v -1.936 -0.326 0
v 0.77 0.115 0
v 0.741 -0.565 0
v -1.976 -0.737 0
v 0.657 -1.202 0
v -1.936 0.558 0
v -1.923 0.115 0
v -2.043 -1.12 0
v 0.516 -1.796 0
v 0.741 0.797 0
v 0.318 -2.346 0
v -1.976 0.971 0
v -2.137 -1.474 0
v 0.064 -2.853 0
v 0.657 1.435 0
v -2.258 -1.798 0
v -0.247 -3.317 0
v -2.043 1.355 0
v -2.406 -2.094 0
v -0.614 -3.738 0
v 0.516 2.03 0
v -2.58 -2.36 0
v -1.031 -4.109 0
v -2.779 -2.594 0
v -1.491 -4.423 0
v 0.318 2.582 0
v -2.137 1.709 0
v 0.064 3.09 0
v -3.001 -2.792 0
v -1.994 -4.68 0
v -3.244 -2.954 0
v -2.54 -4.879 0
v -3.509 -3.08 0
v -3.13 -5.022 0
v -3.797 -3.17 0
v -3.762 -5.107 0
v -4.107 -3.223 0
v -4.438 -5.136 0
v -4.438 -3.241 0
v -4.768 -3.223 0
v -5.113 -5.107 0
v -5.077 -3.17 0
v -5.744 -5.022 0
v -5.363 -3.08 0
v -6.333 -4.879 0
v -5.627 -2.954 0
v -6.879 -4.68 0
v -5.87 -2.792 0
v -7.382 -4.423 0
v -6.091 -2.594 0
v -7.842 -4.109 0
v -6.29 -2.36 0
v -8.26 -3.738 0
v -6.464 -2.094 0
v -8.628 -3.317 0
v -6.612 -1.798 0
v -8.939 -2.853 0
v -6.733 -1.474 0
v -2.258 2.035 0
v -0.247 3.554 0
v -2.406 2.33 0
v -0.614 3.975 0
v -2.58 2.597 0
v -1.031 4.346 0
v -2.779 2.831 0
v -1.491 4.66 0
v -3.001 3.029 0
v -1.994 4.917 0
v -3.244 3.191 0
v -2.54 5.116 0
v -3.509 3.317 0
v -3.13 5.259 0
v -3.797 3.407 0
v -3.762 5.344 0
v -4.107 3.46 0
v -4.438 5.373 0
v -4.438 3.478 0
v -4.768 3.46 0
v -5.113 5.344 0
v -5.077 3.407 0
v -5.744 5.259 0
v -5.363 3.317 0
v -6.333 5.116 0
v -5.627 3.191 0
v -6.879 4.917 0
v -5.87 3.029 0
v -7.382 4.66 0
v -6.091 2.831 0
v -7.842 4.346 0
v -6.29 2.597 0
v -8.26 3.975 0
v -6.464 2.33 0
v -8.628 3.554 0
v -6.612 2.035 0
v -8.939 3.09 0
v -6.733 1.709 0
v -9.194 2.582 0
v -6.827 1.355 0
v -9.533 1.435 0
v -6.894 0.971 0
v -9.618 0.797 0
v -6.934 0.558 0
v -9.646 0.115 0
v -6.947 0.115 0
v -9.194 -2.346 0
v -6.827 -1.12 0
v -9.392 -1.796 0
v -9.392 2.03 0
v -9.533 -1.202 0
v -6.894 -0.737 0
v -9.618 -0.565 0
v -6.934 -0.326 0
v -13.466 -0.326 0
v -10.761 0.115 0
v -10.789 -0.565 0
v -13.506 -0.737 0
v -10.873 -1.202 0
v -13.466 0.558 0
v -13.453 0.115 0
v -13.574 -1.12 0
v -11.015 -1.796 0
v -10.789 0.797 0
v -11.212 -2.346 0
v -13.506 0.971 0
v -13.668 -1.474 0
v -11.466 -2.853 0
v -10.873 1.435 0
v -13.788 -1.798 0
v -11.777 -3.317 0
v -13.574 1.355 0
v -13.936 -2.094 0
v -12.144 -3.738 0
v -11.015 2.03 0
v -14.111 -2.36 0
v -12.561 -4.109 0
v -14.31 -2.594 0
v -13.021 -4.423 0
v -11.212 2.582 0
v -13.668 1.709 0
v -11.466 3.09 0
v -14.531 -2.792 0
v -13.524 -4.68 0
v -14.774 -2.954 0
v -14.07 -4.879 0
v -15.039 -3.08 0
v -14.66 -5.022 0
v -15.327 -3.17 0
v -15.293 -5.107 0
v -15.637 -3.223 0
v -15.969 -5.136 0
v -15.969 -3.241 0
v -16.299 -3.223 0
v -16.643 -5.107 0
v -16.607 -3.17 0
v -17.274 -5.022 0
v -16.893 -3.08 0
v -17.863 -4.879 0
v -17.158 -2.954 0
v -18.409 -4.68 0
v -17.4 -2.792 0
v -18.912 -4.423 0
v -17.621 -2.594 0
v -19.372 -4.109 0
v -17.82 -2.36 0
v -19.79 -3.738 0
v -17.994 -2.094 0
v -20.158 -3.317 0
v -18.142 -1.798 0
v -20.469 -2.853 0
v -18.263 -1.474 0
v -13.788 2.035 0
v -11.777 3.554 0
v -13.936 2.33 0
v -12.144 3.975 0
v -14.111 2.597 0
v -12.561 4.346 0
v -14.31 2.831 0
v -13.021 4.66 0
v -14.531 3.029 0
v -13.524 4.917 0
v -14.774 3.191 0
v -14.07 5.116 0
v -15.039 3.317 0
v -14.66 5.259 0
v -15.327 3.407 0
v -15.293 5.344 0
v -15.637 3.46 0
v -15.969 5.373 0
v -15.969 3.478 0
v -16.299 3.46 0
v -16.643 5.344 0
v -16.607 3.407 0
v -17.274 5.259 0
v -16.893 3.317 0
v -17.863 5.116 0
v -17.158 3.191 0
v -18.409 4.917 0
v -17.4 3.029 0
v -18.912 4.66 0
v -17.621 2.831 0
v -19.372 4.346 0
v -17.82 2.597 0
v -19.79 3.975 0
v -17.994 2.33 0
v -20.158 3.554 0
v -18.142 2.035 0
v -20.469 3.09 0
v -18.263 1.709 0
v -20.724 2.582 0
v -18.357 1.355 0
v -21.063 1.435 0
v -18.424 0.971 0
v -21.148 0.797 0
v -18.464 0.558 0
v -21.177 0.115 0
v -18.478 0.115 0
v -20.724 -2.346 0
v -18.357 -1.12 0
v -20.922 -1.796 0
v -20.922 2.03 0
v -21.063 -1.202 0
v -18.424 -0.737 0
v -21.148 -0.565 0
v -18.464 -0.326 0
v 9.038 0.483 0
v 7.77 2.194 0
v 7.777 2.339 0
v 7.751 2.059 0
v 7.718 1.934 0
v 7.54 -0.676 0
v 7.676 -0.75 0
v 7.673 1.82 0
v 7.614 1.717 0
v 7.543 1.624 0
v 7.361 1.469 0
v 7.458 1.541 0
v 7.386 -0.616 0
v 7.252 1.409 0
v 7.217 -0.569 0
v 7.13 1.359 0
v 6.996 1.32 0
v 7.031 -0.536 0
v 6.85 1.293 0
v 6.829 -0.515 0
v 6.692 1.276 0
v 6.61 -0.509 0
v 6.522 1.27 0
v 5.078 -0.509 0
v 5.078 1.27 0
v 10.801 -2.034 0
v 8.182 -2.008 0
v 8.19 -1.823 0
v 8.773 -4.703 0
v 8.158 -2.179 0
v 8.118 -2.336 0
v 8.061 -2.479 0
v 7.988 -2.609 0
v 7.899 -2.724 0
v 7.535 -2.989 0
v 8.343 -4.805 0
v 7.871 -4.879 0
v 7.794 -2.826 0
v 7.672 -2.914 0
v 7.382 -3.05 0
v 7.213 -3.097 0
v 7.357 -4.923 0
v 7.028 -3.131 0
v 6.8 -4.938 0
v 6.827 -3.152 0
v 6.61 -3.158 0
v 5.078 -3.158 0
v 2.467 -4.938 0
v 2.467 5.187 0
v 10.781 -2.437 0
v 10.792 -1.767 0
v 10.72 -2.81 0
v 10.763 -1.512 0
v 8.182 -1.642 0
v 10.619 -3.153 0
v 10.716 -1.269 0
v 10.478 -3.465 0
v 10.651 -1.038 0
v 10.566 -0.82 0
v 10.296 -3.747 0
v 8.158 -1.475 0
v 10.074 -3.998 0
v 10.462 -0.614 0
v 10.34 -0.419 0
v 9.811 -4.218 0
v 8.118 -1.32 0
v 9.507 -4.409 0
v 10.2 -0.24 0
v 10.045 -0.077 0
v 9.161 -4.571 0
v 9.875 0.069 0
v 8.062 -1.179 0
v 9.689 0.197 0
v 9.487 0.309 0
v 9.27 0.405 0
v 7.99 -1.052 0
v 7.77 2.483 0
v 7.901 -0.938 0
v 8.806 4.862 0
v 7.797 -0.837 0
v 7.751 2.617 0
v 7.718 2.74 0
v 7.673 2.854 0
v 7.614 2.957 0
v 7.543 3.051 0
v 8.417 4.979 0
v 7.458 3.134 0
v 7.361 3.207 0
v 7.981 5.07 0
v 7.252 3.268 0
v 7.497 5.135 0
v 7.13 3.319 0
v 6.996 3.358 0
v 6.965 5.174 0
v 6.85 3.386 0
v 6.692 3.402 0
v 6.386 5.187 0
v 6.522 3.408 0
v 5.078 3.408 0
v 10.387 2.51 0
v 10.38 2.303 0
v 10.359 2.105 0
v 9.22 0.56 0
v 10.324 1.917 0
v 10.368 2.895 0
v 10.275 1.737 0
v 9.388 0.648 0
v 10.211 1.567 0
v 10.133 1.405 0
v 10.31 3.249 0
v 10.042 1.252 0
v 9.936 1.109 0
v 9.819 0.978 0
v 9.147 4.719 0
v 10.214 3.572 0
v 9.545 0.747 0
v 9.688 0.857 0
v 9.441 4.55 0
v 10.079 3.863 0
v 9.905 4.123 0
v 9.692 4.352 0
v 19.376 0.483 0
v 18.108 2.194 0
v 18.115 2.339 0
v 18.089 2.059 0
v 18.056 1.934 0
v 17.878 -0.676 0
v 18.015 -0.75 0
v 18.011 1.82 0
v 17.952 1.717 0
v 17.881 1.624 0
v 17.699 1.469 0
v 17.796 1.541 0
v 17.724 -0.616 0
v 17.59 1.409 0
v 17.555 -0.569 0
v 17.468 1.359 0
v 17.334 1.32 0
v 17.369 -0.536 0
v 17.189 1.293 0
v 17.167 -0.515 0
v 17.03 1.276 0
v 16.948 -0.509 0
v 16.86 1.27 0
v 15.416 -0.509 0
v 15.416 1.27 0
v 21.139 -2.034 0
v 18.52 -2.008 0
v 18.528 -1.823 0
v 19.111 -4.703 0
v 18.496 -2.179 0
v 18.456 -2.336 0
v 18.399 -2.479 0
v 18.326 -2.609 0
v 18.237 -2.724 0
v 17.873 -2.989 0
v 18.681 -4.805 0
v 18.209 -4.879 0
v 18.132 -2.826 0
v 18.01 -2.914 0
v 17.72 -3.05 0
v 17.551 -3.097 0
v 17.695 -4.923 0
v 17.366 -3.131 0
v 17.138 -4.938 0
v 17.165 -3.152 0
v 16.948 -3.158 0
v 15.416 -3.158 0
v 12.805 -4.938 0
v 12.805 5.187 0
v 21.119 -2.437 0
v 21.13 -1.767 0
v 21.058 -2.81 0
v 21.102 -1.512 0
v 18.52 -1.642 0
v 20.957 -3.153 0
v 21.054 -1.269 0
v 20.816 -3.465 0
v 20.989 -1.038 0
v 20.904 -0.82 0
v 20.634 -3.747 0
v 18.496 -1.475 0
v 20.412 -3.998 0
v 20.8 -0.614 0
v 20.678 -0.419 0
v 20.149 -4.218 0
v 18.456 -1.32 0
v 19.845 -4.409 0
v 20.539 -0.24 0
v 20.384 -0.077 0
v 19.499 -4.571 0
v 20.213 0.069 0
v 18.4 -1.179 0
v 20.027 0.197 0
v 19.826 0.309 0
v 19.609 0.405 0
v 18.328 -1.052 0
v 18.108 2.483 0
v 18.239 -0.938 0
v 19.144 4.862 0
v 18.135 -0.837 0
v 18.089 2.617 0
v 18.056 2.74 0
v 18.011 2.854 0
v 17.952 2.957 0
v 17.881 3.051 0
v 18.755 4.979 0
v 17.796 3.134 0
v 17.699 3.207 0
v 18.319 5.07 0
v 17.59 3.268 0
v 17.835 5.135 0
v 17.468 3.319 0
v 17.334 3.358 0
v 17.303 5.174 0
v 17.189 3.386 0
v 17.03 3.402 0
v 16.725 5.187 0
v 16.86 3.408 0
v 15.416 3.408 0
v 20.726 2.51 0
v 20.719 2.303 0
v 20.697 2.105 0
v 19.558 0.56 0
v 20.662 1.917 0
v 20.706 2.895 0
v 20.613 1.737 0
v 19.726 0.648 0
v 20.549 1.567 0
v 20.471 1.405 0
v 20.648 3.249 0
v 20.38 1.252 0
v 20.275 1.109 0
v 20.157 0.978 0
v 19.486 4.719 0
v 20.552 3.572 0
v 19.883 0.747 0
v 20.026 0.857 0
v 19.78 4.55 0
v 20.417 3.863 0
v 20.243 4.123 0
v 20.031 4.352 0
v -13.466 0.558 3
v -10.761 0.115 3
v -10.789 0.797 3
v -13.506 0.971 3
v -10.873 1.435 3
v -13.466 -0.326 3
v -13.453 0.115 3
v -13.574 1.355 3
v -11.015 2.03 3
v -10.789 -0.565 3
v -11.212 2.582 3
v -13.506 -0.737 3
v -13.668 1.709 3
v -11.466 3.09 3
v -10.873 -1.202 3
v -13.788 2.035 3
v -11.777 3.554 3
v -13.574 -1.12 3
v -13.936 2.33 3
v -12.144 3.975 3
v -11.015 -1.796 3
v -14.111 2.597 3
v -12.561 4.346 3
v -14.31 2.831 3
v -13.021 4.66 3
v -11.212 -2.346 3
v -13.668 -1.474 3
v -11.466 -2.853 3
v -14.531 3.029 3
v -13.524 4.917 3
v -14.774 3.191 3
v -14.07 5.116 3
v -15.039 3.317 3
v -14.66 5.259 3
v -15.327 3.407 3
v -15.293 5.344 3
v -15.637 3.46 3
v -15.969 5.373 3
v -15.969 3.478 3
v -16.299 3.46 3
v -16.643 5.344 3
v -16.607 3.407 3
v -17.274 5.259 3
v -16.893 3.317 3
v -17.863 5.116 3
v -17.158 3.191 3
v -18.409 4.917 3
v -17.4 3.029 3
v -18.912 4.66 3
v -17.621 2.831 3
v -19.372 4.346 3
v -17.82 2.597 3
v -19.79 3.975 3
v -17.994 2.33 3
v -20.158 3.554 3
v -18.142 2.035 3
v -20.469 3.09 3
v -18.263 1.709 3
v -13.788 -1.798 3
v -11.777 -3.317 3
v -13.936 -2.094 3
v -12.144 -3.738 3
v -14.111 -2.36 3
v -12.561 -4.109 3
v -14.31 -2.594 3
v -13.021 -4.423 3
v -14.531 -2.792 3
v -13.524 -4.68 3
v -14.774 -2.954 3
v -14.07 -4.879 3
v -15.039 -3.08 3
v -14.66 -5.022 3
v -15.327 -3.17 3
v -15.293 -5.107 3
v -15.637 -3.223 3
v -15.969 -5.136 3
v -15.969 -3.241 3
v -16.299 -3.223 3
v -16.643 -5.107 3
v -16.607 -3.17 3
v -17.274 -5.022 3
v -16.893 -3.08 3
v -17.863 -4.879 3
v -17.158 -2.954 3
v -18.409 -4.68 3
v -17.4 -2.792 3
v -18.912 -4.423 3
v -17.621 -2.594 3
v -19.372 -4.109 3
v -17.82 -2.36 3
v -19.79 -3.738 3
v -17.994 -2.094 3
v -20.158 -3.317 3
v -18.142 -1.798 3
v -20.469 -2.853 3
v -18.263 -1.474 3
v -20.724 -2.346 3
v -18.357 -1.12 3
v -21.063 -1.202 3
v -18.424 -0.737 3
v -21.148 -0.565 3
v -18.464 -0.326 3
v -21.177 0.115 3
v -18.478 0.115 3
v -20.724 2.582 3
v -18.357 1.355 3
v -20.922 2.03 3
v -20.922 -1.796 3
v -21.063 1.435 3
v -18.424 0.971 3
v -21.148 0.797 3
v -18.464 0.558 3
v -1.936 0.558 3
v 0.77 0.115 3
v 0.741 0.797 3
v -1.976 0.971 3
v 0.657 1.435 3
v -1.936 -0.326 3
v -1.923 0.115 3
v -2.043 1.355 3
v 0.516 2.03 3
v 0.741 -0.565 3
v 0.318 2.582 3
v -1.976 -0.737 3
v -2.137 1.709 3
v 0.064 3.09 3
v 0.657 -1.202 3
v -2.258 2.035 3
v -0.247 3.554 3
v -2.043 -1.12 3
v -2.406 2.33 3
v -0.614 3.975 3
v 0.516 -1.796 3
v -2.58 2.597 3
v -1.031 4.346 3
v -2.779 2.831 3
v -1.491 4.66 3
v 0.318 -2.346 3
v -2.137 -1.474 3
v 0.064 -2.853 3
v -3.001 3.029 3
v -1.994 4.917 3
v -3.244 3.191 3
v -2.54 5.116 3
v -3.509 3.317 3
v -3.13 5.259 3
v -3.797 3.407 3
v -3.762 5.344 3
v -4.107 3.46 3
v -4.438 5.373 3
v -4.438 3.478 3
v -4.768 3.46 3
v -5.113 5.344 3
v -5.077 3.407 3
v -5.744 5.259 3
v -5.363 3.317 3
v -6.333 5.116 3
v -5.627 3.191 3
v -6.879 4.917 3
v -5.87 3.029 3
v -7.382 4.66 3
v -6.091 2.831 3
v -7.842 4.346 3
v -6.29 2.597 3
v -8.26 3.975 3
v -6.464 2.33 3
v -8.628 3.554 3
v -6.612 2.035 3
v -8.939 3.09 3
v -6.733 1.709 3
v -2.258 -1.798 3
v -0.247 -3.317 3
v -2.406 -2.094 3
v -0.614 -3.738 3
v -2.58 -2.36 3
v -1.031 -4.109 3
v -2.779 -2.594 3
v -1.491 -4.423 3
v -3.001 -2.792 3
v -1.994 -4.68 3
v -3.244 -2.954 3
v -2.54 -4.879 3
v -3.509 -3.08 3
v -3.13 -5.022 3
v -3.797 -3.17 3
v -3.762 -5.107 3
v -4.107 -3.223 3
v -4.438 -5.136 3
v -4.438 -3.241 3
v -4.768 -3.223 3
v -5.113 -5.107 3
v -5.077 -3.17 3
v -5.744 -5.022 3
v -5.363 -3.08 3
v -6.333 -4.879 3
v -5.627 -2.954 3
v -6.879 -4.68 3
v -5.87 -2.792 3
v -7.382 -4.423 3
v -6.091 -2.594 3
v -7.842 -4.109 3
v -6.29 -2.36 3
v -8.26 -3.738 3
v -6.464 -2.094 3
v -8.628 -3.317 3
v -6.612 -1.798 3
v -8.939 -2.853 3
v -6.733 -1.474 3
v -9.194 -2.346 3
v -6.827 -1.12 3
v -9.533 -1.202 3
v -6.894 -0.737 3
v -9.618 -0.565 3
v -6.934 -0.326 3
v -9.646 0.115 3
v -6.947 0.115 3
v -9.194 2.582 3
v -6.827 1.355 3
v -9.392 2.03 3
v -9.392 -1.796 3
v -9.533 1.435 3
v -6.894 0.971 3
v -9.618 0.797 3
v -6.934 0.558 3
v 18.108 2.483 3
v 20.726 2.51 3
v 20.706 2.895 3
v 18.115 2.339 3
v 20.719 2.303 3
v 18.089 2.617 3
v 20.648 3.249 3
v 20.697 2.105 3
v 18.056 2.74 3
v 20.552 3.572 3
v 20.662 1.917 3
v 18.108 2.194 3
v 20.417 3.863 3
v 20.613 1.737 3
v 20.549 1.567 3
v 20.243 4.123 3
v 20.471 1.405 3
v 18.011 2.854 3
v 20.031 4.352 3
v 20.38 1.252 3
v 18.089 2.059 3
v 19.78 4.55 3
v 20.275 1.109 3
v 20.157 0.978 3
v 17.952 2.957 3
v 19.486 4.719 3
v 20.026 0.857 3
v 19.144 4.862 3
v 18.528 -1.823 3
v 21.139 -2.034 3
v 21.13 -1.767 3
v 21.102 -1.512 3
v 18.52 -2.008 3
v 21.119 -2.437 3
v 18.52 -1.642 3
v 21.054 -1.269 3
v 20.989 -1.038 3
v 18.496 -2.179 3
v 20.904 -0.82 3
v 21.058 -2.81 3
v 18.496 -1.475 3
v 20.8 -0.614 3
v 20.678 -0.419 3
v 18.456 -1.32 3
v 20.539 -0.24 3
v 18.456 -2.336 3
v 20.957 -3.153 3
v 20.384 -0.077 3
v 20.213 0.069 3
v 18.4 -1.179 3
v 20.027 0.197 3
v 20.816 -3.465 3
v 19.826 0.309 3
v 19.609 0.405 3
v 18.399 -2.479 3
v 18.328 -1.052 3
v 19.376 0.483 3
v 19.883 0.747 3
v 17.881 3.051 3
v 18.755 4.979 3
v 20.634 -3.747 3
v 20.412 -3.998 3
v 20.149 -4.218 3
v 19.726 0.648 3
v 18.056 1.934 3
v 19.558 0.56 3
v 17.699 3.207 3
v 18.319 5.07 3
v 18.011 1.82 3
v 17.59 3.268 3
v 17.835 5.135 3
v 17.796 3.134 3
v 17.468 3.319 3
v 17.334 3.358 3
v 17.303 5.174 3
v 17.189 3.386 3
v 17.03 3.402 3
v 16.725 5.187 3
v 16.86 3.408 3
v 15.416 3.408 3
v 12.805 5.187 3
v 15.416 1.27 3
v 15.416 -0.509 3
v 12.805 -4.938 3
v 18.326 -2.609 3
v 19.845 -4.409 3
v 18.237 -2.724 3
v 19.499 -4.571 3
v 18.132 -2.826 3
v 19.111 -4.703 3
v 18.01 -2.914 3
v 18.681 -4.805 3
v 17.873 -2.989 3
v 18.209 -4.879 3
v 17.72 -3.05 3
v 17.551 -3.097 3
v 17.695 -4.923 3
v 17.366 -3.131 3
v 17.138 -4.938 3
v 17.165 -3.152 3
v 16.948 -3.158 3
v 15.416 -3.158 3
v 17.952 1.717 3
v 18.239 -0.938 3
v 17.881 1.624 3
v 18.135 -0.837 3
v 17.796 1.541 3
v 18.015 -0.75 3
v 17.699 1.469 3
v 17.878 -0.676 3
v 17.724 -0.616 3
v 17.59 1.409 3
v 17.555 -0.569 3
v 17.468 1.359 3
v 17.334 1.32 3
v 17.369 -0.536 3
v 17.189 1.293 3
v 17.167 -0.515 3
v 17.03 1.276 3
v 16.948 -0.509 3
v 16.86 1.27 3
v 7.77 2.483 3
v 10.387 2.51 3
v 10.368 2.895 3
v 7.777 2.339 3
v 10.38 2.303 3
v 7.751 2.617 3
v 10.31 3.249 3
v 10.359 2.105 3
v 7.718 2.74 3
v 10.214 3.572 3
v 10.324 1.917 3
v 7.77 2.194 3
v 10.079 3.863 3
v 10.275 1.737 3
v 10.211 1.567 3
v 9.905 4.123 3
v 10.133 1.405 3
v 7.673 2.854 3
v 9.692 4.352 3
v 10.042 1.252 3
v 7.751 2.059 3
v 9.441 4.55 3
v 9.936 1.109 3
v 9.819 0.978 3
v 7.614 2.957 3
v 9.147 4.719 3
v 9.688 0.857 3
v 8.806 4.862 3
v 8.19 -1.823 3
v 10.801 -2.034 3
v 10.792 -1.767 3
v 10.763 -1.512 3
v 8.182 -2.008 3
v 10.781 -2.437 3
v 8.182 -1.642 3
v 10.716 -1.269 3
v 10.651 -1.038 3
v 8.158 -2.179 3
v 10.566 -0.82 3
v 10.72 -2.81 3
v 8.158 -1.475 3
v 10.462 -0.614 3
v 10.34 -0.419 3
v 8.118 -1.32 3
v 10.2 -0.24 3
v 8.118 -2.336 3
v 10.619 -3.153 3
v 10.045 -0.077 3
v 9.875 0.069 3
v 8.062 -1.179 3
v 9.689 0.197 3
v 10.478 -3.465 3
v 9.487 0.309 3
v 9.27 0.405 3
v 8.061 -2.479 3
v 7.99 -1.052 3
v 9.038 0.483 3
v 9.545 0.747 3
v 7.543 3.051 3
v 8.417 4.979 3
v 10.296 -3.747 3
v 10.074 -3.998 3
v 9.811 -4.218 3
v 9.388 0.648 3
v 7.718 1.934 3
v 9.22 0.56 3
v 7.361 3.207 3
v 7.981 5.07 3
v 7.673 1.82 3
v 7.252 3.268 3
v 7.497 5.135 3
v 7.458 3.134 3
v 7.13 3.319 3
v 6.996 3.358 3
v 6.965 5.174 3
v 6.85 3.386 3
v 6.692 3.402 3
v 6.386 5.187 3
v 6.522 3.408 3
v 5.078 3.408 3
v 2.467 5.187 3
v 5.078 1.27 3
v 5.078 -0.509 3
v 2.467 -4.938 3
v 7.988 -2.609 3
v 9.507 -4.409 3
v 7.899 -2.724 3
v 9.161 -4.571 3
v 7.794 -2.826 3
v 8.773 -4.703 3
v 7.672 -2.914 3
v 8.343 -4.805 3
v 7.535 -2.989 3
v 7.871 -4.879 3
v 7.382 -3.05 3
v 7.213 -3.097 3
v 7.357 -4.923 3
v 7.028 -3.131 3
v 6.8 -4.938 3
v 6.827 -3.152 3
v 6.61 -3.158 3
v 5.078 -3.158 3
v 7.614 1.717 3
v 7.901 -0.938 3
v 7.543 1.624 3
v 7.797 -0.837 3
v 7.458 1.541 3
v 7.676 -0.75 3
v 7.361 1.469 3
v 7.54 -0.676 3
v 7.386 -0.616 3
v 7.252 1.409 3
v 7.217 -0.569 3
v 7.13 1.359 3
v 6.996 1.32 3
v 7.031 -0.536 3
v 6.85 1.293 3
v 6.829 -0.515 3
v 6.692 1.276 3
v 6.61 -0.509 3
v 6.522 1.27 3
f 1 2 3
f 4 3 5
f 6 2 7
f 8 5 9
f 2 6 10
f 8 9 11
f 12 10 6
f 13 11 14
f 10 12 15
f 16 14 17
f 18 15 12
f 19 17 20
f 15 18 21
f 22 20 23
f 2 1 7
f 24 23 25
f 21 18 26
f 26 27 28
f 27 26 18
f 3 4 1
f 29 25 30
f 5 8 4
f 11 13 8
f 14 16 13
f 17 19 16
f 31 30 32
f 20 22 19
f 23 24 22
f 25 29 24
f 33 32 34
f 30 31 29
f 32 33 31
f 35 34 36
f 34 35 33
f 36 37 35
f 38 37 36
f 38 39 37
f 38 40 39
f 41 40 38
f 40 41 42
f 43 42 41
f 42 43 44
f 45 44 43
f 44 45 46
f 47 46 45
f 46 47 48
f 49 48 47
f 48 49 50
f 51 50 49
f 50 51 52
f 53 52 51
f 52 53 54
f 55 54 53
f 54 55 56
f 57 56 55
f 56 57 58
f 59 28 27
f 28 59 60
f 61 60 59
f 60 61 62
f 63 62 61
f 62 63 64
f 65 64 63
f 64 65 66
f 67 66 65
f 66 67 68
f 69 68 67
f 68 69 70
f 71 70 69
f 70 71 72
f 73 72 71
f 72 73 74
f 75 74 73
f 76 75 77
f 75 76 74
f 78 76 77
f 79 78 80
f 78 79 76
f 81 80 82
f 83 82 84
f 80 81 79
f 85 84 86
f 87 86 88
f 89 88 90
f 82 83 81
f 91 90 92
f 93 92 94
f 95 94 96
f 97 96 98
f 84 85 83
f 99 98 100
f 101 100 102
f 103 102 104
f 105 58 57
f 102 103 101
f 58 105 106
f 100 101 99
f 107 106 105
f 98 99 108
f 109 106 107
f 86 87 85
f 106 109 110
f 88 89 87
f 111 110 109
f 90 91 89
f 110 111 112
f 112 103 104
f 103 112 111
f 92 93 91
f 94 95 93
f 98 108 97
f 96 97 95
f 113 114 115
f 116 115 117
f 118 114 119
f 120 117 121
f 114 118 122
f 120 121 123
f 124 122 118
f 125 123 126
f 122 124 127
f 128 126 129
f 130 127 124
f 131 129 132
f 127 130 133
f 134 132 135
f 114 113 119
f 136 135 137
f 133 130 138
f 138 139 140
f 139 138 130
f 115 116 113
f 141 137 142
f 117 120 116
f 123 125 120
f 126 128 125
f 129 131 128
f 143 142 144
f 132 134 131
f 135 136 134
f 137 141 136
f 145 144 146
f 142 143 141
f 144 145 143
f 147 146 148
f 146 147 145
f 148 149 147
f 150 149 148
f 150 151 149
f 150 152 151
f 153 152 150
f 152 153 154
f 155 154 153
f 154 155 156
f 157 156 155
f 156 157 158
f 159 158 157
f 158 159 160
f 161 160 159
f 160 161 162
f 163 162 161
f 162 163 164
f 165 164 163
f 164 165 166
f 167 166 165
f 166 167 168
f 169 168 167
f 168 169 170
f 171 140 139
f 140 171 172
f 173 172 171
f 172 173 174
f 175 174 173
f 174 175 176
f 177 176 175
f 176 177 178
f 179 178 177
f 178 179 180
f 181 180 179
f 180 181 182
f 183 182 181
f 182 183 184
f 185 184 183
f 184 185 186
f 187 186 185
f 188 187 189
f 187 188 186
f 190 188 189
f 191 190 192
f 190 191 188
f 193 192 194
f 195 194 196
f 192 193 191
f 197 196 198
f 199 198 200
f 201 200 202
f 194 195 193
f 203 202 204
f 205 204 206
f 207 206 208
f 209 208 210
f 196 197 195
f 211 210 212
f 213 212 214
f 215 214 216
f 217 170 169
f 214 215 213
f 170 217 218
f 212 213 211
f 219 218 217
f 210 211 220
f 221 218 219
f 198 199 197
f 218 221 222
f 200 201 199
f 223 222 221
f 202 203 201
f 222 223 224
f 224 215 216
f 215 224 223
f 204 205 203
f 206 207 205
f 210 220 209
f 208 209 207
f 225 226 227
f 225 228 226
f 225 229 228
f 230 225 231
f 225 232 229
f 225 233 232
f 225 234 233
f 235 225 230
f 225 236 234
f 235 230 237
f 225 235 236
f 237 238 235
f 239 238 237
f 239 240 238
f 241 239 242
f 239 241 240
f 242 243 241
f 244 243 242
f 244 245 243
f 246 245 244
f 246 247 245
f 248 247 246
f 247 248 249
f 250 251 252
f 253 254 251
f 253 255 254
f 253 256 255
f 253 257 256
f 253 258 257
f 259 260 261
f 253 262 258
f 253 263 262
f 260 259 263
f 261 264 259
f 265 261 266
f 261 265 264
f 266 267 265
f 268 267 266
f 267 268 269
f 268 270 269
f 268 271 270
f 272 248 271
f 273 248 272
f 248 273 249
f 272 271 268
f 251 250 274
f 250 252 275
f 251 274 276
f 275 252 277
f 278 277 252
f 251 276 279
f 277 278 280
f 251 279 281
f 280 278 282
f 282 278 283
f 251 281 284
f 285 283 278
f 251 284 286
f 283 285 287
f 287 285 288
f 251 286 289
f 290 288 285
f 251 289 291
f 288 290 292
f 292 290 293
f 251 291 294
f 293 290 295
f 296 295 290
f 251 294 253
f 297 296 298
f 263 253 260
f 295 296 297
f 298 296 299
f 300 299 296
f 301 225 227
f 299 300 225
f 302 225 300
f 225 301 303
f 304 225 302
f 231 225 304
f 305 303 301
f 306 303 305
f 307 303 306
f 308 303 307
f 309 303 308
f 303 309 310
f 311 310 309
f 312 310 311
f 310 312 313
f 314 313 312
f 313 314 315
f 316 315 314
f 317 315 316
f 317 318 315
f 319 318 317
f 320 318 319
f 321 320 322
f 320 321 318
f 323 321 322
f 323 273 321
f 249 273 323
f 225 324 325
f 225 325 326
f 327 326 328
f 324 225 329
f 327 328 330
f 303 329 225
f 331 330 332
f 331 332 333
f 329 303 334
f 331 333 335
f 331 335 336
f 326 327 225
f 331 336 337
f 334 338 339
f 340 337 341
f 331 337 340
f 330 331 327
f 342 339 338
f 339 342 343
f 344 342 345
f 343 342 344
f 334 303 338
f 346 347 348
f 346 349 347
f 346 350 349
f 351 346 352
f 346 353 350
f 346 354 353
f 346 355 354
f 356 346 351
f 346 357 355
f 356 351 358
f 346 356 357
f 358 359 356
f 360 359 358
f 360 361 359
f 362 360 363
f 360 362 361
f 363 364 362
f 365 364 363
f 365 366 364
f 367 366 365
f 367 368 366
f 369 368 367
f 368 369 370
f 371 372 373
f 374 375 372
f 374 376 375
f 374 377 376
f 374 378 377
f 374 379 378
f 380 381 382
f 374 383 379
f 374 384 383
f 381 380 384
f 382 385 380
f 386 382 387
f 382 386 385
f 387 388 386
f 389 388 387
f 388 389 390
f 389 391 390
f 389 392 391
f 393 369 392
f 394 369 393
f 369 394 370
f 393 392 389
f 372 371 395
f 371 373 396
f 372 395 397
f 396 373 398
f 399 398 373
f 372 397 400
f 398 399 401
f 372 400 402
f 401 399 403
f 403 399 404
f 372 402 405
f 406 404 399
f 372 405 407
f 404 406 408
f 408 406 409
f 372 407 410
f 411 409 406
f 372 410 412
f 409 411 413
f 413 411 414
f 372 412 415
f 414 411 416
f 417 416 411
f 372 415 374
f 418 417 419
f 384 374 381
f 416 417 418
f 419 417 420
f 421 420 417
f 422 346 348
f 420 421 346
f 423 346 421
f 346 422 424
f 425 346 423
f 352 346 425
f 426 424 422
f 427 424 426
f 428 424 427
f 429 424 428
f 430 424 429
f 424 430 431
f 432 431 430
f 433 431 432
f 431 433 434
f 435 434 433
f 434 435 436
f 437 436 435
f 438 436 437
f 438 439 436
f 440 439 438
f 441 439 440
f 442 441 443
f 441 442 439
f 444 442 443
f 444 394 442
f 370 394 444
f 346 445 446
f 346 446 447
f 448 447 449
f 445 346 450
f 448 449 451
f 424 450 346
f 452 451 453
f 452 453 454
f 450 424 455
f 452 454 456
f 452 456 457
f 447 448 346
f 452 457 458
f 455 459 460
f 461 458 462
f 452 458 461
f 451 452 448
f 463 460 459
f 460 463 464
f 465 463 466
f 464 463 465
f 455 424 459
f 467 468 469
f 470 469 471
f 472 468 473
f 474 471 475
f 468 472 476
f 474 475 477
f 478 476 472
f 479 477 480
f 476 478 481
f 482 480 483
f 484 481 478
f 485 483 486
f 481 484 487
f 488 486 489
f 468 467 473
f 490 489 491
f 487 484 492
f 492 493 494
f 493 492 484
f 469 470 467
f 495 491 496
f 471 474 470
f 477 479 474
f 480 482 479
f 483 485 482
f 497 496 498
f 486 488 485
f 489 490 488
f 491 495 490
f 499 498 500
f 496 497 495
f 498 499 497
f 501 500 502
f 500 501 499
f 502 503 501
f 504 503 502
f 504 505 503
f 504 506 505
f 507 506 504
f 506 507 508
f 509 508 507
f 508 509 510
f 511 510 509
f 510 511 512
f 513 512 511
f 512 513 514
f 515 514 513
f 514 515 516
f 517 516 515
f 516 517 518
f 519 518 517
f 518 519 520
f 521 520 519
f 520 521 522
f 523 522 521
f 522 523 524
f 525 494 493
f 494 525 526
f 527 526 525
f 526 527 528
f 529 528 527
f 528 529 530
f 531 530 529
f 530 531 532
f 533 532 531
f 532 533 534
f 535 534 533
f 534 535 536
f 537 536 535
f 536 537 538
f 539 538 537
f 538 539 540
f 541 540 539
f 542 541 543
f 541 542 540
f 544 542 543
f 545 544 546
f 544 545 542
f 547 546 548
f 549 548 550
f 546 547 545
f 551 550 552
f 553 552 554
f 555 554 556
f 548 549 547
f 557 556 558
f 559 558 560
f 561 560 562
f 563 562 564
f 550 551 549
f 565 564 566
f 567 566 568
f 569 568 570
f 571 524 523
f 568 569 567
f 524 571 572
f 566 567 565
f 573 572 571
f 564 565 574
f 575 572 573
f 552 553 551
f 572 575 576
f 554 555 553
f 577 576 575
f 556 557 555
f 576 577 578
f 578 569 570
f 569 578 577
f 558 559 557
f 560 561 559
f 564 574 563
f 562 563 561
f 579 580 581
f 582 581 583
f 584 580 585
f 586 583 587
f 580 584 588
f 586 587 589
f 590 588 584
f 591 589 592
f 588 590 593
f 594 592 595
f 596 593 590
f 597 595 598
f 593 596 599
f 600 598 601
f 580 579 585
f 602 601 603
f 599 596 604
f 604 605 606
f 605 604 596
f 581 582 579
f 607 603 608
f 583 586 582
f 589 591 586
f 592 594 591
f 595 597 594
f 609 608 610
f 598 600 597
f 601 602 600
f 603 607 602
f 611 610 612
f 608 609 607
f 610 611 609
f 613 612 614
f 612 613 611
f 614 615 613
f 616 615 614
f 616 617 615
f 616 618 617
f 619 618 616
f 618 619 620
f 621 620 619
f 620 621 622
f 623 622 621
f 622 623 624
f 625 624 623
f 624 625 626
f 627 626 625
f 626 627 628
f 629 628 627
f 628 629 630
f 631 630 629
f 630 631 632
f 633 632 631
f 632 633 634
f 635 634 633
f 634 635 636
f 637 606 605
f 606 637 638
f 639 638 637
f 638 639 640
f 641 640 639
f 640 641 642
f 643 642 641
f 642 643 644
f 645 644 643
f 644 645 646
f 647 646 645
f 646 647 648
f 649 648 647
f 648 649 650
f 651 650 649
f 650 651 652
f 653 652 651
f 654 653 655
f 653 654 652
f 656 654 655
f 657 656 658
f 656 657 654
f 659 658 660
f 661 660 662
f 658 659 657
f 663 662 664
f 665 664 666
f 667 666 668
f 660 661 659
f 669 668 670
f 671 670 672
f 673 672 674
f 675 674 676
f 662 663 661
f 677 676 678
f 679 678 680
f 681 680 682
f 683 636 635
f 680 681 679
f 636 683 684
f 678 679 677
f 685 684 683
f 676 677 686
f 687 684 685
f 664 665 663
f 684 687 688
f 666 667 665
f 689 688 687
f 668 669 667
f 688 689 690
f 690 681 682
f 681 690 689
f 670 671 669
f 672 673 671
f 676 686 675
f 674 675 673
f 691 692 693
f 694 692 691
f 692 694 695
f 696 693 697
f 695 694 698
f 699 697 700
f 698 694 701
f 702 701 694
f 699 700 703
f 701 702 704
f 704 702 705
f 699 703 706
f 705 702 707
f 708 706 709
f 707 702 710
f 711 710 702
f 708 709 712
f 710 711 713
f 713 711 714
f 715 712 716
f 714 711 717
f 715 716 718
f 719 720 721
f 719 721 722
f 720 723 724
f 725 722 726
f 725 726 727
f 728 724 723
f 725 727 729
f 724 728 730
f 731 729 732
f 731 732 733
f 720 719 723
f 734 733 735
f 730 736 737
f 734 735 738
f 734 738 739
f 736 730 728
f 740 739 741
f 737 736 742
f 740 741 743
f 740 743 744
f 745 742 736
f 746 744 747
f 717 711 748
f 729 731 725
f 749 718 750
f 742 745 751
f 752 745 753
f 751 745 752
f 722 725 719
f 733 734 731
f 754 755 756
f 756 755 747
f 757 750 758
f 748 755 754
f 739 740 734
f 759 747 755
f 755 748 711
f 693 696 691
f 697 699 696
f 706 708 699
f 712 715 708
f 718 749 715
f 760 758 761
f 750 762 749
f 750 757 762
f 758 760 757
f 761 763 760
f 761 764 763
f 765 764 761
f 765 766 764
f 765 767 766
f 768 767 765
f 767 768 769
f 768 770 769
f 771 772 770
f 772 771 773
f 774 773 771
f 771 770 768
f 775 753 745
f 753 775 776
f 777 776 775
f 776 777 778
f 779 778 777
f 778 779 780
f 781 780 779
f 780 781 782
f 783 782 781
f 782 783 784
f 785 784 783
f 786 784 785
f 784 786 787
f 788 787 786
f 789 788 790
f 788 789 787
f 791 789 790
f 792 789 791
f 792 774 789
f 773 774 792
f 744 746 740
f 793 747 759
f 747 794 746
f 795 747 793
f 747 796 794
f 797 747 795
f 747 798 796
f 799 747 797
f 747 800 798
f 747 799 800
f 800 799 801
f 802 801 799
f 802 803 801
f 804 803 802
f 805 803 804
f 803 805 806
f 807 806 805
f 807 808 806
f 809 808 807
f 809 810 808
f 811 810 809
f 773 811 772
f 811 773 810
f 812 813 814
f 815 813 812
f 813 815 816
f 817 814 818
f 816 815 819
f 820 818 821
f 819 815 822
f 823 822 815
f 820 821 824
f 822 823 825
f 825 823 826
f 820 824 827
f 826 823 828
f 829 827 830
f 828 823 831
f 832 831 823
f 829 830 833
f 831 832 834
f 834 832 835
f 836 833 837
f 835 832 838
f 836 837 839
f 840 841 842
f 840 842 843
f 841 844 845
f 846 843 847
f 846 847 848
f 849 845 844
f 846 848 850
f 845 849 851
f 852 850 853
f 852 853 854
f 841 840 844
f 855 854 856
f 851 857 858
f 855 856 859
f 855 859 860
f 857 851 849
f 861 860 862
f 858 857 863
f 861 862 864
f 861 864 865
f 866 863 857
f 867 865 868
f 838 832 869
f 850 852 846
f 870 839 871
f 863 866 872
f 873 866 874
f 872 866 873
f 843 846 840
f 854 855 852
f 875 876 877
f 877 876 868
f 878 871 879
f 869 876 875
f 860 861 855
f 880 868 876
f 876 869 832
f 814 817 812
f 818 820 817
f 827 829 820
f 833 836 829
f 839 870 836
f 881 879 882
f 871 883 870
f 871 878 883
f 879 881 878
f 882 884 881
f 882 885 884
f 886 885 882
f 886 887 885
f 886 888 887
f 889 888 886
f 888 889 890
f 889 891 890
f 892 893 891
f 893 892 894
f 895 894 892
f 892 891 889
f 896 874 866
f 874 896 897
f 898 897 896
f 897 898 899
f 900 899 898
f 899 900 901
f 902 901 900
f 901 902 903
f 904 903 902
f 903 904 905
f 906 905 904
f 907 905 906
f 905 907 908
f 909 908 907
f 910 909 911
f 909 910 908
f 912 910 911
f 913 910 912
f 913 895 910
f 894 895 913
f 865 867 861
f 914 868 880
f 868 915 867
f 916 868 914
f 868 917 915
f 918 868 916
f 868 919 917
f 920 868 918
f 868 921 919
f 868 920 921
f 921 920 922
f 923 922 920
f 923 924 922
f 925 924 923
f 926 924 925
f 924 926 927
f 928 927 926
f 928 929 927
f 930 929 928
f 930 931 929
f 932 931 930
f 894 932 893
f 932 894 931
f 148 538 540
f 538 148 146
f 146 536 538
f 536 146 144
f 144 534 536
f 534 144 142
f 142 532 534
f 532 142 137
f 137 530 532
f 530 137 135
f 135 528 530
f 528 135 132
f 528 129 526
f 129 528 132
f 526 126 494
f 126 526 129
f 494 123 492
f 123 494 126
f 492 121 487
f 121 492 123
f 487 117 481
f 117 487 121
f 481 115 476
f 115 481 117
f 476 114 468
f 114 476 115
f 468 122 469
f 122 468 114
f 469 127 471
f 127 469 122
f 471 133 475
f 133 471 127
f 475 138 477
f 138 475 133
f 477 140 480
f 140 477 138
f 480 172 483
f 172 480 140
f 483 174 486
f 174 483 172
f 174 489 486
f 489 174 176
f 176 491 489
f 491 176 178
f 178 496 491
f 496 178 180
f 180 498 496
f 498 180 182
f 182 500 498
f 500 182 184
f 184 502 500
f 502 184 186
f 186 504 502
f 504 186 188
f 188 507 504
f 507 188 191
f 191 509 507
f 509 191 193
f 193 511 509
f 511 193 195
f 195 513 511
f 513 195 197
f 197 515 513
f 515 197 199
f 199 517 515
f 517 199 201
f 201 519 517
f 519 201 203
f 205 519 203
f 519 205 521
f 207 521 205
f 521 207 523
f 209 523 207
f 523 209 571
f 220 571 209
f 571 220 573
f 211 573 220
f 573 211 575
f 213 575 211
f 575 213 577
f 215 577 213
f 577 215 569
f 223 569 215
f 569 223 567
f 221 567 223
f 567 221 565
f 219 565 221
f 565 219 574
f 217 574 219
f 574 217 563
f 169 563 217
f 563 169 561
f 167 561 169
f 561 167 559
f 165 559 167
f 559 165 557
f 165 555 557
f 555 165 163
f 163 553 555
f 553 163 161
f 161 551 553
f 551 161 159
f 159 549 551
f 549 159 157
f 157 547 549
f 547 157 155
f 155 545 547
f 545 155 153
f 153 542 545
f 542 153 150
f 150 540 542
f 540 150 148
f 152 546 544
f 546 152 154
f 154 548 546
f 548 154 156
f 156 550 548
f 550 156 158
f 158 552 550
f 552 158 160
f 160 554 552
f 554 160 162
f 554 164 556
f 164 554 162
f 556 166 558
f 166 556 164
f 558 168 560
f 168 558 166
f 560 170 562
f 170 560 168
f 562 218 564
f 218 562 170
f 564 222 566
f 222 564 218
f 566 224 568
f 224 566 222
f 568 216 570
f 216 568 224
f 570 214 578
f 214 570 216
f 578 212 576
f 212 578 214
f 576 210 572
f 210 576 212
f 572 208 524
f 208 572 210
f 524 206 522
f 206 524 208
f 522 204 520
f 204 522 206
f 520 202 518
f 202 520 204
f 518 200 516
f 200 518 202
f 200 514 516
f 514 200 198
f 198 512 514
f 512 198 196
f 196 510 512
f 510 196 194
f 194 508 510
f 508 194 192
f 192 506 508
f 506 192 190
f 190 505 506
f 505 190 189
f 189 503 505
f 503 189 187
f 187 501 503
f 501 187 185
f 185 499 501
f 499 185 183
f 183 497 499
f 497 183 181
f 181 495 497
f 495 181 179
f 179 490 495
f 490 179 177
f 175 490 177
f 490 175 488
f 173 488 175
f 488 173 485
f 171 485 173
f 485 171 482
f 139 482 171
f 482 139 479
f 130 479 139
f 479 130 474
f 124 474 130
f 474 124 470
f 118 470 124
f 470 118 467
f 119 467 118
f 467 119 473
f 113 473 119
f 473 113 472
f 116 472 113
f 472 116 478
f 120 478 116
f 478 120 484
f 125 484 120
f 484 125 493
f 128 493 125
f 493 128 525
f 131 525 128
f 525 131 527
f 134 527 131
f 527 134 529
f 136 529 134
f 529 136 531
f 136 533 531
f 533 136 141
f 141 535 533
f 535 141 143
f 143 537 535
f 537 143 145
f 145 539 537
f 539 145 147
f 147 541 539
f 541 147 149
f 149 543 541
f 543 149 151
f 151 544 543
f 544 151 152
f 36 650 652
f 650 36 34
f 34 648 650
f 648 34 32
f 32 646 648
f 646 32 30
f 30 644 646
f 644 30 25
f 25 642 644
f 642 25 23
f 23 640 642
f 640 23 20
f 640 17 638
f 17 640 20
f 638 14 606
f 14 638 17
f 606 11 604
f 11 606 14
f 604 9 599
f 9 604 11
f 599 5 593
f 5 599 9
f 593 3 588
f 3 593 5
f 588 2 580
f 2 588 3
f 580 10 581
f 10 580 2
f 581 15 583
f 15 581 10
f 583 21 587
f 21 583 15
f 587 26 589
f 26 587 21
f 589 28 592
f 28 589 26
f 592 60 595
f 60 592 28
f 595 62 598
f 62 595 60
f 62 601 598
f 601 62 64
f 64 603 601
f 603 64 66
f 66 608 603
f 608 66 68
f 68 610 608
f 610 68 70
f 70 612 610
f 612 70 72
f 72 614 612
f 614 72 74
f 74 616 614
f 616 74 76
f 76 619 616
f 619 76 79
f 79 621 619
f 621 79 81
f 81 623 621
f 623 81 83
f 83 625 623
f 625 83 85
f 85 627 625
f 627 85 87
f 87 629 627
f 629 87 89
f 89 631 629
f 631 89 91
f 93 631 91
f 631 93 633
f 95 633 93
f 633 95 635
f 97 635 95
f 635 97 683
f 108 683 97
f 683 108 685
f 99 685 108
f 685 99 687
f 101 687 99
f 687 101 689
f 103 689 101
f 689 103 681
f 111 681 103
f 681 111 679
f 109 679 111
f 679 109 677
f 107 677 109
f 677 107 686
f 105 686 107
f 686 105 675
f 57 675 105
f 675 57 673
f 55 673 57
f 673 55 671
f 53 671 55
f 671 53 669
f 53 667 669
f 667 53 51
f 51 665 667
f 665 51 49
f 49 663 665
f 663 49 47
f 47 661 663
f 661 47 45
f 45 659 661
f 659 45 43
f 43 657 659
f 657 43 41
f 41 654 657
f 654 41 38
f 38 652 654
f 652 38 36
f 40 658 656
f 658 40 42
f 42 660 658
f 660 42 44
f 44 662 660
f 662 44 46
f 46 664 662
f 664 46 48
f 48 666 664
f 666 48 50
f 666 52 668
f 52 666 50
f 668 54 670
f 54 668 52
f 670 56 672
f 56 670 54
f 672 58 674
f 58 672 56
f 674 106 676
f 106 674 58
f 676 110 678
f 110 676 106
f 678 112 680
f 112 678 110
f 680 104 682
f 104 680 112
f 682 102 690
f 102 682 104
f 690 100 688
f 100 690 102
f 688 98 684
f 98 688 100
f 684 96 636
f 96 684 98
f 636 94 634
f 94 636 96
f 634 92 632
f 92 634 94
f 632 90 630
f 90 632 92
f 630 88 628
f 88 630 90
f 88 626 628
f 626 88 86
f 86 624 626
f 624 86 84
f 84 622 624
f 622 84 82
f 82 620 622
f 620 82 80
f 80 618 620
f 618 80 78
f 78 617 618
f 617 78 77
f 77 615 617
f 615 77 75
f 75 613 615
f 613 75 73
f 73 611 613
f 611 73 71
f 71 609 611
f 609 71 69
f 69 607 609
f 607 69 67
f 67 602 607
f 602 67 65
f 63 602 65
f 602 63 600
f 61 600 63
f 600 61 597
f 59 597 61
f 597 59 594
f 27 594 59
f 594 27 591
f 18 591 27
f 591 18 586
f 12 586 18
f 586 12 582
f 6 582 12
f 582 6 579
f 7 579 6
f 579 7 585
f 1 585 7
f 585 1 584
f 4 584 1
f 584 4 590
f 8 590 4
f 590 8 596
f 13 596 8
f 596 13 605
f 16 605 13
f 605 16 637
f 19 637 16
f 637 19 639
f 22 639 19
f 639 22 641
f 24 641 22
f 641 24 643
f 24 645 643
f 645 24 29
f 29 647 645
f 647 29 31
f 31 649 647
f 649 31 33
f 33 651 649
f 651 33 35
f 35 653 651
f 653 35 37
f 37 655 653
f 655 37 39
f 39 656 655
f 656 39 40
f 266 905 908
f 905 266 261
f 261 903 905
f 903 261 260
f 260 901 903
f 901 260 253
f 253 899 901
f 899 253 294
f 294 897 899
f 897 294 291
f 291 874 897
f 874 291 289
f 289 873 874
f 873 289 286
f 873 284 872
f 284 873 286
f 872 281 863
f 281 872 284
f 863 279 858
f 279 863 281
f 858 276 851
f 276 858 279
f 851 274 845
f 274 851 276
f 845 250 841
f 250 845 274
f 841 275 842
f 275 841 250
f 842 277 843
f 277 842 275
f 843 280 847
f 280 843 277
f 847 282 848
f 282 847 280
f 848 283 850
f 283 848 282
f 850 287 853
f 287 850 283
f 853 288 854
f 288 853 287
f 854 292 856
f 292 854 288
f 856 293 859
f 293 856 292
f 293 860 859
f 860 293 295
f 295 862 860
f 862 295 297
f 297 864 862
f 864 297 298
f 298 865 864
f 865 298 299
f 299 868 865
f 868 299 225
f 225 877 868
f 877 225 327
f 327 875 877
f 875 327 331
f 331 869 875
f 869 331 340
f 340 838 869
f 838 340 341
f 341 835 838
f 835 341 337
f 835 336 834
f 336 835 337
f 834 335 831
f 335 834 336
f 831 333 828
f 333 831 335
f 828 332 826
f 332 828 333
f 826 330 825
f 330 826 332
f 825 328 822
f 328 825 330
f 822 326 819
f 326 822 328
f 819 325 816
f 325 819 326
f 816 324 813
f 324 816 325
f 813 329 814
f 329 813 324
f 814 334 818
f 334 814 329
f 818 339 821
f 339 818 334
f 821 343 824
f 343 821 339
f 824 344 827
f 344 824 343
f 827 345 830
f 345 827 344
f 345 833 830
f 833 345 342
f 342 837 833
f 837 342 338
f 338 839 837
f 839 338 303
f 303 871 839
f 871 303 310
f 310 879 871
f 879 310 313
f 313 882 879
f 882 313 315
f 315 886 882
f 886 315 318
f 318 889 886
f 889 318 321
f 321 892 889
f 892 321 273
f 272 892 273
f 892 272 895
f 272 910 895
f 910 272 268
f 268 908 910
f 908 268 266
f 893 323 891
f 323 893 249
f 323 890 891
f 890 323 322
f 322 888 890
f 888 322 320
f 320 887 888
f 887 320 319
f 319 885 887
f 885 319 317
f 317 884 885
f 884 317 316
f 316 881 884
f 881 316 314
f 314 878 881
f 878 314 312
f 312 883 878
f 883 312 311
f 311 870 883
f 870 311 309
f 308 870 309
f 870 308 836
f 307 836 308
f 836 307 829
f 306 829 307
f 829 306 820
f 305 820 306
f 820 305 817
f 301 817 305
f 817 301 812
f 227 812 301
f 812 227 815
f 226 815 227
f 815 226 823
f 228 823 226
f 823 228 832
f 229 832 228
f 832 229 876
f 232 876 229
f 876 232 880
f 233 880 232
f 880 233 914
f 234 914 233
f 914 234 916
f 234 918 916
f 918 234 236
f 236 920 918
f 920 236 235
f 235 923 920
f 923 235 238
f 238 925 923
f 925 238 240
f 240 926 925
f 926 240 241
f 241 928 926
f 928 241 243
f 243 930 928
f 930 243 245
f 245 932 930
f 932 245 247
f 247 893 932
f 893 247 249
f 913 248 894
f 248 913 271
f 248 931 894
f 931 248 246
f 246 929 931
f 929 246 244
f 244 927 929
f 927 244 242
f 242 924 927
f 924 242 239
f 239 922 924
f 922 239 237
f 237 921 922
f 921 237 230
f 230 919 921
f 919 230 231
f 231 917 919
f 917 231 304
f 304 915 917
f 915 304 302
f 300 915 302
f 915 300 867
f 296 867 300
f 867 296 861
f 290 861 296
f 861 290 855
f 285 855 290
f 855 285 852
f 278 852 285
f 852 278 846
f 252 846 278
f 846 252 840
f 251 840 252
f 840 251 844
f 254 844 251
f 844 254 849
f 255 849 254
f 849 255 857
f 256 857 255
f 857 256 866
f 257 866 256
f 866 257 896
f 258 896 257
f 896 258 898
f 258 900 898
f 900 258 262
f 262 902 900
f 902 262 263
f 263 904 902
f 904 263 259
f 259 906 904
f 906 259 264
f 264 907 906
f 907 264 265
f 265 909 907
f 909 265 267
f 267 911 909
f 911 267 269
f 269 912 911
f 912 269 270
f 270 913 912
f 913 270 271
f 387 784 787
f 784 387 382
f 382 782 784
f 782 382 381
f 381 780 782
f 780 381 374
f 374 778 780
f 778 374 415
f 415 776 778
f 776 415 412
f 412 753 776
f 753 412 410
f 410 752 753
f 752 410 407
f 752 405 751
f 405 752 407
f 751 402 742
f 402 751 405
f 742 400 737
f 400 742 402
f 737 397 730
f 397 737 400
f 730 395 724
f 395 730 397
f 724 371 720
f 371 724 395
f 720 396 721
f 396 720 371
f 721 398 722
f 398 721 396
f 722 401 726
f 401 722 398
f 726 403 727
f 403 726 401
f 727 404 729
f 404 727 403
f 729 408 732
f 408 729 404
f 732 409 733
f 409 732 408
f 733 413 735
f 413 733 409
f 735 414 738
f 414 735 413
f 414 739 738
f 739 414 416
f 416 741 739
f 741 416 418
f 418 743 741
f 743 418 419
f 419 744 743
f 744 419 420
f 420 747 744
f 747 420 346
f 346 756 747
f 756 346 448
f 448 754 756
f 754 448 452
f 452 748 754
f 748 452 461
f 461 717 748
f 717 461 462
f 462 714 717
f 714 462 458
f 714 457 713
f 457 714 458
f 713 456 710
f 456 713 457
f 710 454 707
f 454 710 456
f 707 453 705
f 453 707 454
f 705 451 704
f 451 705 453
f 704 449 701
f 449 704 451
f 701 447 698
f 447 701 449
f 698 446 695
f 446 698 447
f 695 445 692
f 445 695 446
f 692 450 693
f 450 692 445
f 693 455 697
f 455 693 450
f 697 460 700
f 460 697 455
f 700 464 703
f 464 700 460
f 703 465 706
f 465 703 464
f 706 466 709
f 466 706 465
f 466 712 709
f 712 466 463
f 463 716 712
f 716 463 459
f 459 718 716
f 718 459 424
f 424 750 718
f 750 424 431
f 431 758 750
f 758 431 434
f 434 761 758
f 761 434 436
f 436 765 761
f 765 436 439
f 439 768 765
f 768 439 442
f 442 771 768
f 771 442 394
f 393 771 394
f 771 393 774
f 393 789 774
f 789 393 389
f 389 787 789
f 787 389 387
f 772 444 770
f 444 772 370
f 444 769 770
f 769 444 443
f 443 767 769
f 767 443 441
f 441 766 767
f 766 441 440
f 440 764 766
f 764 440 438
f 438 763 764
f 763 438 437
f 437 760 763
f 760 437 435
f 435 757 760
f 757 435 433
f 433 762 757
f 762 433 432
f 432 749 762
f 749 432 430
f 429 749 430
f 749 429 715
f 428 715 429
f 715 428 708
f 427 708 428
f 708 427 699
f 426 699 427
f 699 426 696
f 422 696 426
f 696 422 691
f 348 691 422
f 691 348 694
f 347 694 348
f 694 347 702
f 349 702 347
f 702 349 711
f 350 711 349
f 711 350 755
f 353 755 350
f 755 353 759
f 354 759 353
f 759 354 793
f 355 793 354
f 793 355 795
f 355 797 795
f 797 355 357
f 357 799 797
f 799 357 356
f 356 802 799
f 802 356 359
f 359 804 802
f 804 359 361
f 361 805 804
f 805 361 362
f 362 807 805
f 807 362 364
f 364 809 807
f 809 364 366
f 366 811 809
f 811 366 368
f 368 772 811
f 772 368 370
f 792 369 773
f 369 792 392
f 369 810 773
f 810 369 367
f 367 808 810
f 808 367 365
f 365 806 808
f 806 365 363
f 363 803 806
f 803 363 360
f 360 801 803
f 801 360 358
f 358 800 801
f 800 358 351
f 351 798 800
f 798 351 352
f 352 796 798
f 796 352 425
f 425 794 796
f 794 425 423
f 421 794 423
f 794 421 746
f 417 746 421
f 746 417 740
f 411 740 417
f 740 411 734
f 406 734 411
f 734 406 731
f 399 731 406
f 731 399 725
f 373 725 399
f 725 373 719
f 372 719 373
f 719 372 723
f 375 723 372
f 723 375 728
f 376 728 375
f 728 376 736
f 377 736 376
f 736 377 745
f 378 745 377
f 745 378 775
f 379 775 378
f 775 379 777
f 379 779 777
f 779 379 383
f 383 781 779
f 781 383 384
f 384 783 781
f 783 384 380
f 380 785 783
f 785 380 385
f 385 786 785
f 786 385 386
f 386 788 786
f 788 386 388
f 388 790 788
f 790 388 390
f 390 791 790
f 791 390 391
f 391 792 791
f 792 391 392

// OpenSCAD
$fn = 50;

difference() {
	union() {
		linear_extrude(height = 3) {
			text(font = "DejaVu Sans:style=Bold", halign = "center", size = 10, text = "OOBB", valign = "center");
		}
	}
	union();
}
